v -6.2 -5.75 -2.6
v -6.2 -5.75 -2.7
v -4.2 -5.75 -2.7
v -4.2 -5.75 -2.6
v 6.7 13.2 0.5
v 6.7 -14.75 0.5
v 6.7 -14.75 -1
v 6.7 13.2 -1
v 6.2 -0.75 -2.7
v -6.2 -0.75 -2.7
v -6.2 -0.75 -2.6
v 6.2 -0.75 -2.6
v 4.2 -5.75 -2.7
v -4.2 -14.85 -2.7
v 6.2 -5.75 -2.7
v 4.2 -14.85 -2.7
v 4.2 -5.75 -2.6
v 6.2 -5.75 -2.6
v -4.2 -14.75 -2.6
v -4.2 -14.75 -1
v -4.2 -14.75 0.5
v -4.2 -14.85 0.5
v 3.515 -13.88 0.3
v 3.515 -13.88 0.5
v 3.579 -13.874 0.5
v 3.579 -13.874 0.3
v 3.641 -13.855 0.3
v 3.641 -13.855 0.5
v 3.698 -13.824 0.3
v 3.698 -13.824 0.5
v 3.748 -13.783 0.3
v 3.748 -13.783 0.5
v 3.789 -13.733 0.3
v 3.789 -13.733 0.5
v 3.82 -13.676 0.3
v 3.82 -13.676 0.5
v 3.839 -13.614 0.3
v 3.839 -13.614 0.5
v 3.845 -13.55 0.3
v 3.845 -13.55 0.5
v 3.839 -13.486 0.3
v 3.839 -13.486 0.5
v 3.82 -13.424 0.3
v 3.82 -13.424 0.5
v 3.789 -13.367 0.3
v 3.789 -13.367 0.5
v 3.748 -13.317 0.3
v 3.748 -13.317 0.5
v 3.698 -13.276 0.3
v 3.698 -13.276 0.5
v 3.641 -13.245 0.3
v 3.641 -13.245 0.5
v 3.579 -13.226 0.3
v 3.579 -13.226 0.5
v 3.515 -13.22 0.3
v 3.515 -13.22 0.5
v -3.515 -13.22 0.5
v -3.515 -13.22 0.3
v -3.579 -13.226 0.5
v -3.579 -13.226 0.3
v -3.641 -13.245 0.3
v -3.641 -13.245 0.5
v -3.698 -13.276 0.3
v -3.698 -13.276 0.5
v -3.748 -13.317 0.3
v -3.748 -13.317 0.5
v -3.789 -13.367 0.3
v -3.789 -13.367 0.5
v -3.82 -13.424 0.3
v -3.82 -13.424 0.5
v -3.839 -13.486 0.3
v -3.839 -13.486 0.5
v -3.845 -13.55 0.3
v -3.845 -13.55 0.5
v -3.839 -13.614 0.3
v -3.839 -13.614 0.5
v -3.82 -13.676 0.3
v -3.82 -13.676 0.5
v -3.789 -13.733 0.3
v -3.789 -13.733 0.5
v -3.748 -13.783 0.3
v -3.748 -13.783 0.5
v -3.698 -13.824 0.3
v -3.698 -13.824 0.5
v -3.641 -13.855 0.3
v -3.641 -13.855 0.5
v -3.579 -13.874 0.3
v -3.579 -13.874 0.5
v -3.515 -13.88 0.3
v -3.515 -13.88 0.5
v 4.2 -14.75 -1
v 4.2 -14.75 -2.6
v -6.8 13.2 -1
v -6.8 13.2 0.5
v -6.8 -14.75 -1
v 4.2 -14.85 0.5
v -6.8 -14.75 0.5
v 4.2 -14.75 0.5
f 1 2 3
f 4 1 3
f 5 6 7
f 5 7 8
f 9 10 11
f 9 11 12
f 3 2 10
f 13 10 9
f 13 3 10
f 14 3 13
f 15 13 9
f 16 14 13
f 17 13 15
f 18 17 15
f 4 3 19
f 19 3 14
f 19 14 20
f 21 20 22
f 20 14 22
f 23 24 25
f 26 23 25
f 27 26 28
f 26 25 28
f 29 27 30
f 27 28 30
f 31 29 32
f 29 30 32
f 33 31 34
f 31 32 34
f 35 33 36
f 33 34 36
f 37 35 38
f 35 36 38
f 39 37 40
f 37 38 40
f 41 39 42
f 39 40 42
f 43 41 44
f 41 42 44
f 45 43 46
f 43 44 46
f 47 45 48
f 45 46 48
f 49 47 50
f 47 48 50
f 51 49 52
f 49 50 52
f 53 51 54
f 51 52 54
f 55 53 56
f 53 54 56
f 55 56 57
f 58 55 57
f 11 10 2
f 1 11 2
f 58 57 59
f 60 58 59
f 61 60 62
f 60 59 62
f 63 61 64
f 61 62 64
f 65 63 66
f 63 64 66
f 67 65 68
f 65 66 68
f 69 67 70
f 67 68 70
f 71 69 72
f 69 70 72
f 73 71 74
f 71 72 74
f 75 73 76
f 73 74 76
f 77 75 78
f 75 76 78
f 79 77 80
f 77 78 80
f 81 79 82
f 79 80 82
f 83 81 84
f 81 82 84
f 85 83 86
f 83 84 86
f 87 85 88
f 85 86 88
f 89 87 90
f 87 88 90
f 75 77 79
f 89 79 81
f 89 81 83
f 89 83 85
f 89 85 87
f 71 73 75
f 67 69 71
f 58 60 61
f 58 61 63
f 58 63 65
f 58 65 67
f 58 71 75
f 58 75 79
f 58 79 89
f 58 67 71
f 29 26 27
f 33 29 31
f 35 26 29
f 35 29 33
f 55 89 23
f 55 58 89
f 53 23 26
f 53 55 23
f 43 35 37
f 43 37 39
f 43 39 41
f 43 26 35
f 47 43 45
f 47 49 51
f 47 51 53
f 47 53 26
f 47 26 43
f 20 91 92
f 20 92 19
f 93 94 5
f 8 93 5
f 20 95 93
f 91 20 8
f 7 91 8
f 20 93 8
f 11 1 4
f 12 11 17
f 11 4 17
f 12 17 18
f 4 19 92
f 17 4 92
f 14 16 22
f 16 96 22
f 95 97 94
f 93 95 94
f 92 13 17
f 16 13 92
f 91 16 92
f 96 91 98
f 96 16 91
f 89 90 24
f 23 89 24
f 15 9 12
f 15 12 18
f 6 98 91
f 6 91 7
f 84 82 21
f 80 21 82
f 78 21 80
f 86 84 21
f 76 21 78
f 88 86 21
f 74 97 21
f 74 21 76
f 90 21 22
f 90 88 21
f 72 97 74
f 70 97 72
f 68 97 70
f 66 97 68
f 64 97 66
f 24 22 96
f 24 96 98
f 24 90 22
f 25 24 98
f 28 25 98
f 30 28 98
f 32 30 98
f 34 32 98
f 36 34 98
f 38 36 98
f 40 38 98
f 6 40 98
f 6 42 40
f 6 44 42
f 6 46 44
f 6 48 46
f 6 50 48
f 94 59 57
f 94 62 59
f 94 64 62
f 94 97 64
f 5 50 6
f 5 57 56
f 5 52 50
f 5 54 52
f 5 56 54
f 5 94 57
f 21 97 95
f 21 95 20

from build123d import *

# Parameters (mm, degrees)
SKETCH_W        = 10.8
SKETCH_H        = 21.7
PAD_DEPTH       = 0.5
SKETCH001_W     = 12.8
SKETCH001_H     = 24.6
PAD001_DEPTH    = 0.6
SKETCH002_W     = 13.5
SKETCH002_H     = 27.95
PAD002_DEPTH    = 1.5
SKETCH003_W     = 8.4
SKETCH003_H     = 1.5
PAD003_DEPTH    = 0.1
PAD003_FACE10_W = 0.1
PAD003_FACE10_H = 8.4
PAD004_DEPTH    = 1.7
SKETCH005_W     = 8.4
SKETCH005_H     = 0.1
PAD005_DEPTH    = 14
SKETCH006_W     = 12.4
SKETCH006_H     = 5
PAD006_DEPTH    = 0.1
POCKET_DEPTH    = 0.2


with BuildPart() as part:
    # Sketch → Pad (new body)
    with BuildSketch(Plane.XY):
        Rectangle(SKETCH_W, SKETCH_H)
    extrude(amount=PAD_DEPTH)

    # Sketch001 (on Face6 of Pad) → Pad001 (join)
    with BuildSketch(Plane.XY.offset(0.5)):
        Rectangle(SKETCH001_W, SKETCH001_H)
    extrude(amount=-PAD001_DEPTH)

    # Sketch002 (on Face4 of Pad001) → Pad002 (join)
    with BuildSketch(Plane.XY.offset(0.5)):
        with Locations((-0.05, -0.775)):
            Rectangle(SKETCH002_W, SKETCH002_H)
    extrude(amount=-PAD002_DEPTH)

    # Sketch003 (on Face6 of Pad002) → Pad003 (join)
    with BuildSketch(Plane.XZ.offset(14.75)):
        with Locations((0, -0.25)):
            Rectangle(SKETCH003_W, SKETCH003_H)
    extrude(amount=PAD003_DEPTH)

    # Pad003 Face10 → Pad004 (add)
    with BuildSketch(Plane(origin=(0, -14.8, -1), x_dir=(0, -1, 0), z_dir=(0, 0, -1))):
        Rectangle(PAD003_FACE10_W, PAD003_FACE10_H)
    extrude(amount=PAD004_DEPTH)

    # Sketch005 (on Face10 of Pad004) → Pad005 (join)
    with BuildSketch(Plane(origin=(0, -14.75, 0), x_dir=(-1, 0, 0), z_dir=(0, 1, 0))):
        with Locations((0, -2.65)):
            Rectangle(SKETCH005_W, SKETCH005_H)
    extrude(amount=PAD005_DEPTH)

    # Sketch006 (on Face23 of Pad005) → Pad006 (join)
    with BuildSketch(Plane(origin=(0, 0, -2.7), x_dir=(1, 0, 0), z_dir=(0, 0, -1))):
        with Locations((0, 3.25)):
            Rectangle(SKETCH006_W, SKETCH006_H)
    extrude(amount=-PAD006_DEPTH)

    # Sketch007 (on Face4 of Pad006) → Pocket (cut)
    with BuildSketch(Plane.XY.offset(0.5)):
        with BuildLine():
            ThreePointArc((-3.515, -13.22), (-3.845, -13.55), (-3.515, -13.88))
            Line((-3.515, -13.88), (3.515, -13.88))
            ThreePointArc((3.515, -13.88), (3.845, -13.55), (3.515, -13.22))
            Line((3.515, -13.22), (-3.515, -13.22))
        make_face()
    extrude(amount=-POCKET_DEPTH, mode=Mode.SUBTRACT)


solid = part.part
